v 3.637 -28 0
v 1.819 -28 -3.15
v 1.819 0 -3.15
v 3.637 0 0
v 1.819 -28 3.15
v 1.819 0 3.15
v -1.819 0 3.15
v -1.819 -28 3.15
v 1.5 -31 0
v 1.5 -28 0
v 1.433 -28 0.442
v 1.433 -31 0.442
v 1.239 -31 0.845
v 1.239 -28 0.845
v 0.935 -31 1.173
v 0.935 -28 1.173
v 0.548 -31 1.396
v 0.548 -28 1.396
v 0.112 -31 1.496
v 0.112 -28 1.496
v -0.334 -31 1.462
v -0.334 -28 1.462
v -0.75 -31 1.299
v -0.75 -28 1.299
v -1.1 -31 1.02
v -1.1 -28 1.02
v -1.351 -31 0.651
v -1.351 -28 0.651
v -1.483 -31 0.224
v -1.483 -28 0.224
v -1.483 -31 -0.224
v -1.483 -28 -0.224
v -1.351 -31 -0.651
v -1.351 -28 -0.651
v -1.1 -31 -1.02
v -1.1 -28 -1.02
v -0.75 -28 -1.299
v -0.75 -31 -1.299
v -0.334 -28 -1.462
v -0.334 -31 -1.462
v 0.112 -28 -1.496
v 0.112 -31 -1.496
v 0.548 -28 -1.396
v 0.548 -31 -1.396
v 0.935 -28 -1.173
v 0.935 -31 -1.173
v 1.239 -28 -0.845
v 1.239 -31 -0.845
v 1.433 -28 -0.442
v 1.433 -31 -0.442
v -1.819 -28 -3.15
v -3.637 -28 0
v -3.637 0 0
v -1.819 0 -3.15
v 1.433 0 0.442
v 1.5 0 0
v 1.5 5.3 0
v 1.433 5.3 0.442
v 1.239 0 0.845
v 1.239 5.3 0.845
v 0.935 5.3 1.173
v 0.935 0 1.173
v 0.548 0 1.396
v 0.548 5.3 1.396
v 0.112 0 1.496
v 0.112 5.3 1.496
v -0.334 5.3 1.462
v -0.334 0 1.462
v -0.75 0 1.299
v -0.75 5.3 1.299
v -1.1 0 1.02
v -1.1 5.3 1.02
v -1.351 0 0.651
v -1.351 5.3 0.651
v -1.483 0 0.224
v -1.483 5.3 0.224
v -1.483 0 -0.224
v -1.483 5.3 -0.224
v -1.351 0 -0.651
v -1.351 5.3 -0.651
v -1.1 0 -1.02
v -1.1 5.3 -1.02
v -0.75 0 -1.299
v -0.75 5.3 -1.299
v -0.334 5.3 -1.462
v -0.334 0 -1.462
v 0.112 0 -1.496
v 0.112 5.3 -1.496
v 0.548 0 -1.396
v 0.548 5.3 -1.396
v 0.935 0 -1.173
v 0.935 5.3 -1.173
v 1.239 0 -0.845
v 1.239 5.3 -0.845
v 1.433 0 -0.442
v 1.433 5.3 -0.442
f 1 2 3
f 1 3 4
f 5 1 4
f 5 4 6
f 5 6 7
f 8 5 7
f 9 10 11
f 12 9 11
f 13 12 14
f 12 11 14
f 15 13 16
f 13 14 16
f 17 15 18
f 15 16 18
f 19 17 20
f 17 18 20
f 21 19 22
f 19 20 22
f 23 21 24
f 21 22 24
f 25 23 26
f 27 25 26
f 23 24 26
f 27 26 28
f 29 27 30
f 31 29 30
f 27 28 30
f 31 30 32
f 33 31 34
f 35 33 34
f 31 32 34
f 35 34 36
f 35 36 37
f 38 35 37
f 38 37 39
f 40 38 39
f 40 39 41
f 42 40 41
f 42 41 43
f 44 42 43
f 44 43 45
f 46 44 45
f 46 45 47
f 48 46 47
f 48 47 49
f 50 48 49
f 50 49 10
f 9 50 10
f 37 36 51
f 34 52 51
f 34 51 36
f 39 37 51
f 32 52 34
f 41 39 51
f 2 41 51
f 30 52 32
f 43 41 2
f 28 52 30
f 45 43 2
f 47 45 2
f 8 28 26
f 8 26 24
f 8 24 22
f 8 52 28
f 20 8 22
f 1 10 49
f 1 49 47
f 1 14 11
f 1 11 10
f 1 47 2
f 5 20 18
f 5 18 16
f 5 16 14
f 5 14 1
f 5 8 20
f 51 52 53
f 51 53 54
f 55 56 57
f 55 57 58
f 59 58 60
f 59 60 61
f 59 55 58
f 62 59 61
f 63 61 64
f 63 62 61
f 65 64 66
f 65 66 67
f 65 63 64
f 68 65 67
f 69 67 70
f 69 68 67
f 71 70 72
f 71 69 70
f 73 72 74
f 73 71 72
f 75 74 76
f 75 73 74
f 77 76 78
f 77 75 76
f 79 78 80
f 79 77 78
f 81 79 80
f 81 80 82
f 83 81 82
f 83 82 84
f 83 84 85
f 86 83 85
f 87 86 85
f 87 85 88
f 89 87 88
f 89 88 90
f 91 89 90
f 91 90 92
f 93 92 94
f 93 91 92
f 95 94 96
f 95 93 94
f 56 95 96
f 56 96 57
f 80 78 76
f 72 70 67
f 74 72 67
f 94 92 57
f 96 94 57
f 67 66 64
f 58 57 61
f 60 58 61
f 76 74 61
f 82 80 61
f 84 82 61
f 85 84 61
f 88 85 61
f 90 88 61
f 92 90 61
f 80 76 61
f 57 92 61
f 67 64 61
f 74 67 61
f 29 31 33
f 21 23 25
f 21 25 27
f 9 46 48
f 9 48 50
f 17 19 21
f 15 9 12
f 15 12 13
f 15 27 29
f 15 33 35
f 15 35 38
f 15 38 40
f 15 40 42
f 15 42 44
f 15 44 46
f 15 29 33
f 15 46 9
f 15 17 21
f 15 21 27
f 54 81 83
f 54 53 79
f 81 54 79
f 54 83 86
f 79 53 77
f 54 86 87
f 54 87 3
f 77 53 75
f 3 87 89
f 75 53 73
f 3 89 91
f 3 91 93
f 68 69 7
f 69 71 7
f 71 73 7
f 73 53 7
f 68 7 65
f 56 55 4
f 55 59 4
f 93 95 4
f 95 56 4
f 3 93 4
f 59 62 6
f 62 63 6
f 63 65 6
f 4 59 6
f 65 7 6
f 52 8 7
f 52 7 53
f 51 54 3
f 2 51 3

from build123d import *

# Parameters (mm, degrees)
F1_DEPTH = 28
F2_R     = 1.5
F3_DEPTH = 5.3
F4_R     = 1.5
F5_DEPTH = 31


with BuildPart() as f1:
    # F0 (on Front) → F1 (new body)
    with BuildSketch(Plane.XZ):
        Polygon((1.818653, 3.15), (-1.818653, 3.15), (-3.637307, 0), (-1.818653, -3.15), (1.818653, -3.15), (3.637307, 0), align=None)
    extrude(amount=F1_DEPTH)

    # F2 (on Front) → F3 (join)
    with BuildSketch(Plane.XZ):
        Circle(F2_R)
    extrude(amount=-F3_DEPTH)

    # F4 (on Front) → F5 (join)
    with BuildSketch(Plane.XZ):
        Circle(F4_R)
    extrude(amount=F5_DEPTH)


solid = f1.part
